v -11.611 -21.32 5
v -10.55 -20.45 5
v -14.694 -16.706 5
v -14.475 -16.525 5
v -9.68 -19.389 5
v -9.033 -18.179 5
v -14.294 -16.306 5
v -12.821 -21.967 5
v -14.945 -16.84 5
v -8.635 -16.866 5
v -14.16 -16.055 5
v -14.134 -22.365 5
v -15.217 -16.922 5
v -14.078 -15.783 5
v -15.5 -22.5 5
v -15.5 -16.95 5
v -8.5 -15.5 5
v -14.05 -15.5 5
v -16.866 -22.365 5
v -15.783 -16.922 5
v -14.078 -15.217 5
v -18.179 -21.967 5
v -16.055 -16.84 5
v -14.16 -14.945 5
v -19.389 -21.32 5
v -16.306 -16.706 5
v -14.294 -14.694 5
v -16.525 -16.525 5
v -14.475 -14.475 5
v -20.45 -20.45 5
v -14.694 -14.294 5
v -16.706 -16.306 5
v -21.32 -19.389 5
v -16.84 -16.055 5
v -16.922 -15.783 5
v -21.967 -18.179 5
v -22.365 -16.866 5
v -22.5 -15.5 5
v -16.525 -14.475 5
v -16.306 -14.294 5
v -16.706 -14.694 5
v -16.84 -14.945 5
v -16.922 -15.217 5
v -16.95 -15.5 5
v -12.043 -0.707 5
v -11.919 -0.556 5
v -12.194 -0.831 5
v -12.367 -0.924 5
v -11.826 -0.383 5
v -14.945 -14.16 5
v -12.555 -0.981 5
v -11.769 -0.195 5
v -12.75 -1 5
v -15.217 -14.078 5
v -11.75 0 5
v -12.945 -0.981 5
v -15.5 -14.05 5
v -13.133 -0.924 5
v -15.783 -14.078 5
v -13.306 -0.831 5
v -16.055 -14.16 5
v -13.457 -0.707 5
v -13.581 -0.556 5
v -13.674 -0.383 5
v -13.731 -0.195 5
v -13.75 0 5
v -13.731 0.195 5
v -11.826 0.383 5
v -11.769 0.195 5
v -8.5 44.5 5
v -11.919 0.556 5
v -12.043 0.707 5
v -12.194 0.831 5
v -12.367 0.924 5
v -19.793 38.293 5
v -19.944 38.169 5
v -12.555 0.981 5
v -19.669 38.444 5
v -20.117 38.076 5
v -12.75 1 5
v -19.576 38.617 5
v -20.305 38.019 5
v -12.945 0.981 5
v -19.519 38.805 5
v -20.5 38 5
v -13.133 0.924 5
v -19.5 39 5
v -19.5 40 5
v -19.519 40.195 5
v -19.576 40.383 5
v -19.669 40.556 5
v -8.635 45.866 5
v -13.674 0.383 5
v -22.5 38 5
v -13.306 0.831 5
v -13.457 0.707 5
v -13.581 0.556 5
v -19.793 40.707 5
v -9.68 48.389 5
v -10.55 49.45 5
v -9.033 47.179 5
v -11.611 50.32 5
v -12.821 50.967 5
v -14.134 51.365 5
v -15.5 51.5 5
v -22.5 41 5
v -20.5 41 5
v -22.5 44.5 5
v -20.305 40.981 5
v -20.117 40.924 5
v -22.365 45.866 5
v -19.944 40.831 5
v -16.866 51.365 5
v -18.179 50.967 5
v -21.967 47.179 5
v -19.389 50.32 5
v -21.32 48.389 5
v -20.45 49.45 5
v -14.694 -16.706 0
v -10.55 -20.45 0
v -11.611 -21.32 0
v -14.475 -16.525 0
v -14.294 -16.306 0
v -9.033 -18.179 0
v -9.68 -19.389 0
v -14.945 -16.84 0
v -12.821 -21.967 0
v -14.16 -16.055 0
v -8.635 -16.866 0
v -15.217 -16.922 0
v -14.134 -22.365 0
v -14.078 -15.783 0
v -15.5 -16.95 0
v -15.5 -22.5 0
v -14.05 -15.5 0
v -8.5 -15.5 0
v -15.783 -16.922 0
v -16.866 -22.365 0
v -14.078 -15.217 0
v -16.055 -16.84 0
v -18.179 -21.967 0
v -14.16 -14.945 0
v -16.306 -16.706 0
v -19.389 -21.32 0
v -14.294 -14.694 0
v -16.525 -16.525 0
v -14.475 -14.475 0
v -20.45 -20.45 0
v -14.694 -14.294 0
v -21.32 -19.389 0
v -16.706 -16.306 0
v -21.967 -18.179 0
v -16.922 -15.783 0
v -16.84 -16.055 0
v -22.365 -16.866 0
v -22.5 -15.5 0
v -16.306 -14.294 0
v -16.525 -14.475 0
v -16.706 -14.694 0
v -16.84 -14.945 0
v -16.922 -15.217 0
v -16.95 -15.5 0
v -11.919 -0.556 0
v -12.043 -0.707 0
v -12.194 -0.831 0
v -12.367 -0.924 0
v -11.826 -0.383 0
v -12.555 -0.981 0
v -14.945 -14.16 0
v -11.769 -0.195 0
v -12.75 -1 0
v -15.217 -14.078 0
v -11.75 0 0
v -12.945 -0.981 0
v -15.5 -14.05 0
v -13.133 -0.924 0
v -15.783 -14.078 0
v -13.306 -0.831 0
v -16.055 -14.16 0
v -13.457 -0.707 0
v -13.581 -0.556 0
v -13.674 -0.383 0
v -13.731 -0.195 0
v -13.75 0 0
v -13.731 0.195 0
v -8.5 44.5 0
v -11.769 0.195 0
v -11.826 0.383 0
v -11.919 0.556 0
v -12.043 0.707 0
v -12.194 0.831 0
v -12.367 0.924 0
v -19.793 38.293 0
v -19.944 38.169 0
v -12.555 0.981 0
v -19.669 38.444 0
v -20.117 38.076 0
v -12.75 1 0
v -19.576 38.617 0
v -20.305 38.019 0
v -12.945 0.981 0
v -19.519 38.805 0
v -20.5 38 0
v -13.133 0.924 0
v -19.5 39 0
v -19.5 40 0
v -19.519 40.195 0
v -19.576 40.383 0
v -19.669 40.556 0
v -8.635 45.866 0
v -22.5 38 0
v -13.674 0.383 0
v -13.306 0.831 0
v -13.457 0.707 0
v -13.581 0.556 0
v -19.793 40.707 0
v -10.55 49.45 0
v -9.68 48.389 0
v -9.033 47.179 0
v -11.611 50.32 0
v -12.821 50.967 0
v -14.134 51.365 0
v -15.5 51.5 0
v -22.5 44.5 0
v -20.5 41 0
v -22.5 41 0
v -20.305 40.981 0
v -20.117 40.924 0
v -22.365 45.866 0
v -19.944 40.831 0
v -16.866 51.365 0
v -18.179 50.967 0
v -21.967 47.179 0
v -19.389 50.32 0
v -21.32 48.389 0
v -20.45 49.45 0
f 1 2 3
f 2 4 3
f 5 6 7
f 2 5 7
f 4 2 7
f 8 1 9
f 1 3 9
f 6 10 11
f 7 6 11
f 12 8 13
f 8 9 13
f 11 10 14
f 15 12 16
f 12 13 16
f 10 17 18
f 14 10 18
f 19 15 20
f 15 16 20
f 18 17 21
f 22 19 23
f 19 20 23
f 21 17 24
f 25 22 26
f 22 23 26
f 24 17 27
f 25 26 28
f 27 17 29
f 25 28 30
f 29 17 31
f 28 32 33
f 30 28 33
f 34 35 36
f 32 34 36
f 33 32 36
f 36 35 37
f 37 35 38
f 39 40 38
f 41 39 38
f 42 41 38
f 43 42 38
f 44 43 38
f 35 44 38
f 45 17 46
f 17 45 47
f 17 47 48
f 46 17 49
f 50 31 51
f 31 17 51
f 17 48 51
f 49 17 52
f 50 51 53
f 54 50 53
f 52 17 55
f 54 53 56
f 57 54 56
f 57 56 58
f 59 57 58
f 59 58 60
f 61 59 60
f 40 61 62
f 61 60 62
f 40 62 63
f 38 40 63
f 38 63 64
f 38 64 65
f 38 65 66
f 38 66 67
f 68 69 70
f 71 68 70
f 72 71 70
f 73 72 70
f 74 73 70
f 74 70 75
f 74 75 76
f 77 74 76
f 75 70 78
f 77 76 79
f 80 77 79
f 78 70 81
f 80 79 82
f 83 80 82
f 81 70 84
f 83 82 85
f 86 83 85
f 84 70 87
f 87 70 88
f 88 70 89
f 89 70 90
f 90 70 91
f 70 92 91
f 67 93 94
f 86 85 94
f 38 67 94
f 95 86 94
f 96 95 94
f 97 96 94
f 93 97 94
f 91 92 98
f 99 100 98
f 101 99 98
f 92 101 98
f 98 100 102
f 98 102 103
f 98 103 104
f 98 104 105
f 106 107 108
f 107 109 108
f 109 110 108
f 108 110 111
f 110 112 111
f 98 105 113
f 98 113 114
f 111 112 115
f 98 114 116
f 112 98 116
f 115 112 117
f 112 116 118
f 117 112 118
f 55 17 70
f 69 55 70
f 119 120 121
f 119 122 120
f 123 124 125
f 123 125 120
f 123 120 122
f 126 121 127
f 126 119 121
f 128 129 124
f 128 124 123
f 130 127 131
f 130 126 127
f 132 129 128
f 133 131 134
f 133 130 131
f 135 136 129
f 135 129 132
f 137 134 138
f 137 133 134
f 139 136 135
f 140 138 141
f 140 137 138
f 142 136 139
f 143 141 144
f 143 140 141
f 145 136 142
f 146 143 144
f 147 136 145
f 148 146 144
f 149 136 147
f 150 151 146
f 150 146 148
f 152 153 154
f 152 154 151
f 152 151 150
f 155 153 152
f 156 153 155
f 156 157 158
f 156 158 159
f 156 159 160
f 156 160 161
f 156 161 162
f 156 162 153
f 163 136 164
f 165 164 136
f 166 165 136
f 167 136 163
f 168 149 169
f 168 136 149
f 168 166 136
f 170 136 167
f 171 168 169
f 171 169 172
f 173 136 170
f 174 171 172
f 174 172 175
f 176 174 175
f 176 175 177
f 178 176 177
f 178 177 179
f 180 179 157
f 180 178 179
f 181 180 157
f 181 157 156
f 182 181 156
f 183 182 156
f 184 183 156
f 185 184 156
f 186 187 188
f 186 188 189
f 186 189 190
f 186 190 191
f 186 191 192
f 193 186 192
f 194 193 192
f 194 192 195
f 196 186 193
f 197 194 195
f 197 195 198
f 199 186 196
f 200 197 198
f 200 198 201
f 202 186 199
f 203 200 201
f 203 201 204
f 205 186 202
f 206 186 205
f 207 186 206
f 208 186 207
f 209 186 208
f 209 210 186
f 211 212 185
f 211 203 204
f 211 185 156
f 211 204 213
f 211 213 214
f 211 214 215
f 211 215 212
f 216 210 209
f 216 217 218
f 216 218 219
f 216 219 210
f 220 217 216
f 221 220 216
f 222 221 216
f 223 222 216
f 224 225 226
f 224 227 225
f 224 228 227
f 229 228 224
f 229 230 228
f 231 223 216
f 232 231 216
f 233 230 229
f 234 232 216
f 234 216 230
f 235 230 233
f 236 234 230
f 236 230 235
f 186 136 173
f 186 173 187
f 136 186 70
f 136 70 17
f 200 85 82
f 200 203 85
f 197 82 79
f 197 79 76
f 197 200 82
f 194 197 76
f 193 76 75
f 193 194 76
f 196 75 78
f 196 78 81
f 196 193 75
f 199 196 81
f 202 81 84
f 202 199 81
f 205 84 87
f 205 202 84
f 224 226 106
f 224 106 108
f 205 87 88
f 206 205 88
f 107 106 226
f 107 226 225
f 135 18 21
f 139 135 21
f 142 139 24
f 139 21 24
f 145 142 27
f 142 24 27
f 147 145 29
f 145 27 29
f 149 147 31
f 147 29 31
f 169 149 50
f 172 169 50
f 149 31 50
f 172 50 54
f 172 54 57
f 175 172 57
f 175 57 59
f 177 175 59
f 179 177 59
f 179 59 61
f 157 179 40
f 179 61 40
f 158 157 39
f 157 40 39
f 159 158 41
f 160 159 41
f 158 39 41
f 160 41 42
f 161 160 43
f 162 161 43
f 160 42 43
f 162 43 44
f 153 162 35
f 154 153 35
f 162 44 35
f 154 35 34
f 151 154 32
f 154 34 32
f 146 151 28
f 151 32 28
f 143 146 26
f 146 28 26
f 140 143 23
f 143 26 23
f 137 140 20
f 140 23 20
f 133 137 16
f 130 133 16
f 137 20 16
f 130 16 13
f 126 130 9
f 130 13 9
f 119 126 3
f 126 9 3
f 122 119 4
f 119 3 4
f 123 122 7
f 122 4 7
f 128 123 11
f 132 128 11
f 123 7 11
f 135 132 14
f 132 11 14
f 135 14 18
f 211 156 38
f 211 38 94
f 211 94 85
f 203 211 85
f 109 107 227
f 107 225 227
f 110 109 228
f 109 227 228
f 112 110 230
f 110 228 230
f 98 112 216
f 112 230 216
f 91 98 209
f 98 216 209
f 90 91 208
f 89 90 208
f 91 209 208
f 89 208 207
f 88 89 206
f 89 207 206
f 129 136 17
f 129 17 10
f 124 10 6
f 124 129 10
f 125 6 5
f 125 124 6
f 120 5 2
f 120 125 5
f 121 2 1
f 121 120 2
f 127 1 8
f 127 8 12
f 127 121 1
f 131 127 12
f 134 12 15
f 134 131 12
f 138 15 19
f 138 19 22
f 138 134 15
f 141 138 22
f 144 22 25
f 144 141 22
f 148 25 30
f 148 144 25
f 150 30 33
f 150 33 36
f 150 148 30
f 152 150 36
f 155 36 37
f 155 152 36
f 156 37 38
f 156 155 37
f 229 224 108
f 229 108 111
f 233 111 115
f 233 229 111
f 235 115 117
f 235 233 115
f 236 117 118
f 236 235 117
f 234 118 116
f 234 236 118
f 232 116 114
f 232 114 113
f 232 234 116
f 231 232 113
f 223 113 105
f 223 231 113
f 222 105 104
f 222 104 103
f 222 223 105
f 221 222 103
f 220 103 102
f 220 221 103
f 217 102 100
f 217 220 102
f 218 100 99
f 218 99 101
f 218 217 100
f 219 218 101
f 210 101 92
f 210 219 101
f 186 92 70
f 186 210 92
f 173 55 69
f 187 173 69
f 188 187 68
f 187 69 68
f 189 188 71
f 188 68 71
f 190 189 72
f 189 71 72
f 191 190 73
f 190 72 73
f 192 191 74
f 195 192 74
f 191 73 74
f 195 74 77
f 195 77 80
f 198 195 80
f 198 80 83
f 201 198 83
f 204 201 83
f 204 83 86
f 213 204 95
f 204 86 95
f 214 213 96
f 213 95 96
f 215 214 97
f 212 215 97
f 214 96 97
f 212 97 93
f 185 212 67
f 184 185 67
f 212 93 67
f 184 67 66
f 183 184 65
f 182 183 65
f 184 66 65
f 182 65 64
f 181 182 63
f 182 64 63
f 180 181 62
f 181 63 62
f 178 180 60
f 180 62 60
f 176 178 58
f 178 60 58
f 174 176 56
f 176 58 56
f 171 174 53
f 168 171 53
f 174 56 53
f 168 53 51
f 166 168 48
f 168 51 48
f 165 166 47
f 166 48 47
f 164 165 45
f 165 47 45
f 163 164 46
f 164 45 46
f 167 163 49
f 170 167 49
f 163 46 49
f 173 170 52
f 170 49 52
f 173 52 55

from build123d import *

# Parameters (mm, degrees)
BOSS_EXTRUDE1_DEPTH = 5
SKETCH2_R           = 1
CUT_EXTRUDE1_DEPTH  = 5
SKETCH3_W           = 3
SKETCH3_H           = 3
CUT_EXTRUDE2_DEPTH  = 5
FILLET1_R           = 1
SKETCH4_R           = 1.45
CUT_EXTRUDE3_DEPTH  = 5


with BuildPart() as part:
    # Sketch1 → Boss-Extrude1 (new body)
    with BuildSketch(Plane.XY):
        with BuildLine():
            Line((-22.5, -15.5), (-22.5, 44.5))
            ThreePointArc((-22.5, 44.5), (-15.5, 51.5), (-8.5, 44.5))
            Line((-8.5, 44.5), (-8.5, -15.5))
            ThreePointArc((-8.5, -15.5), (-15.5, -22.5), (-22.5, -15.5))
        make_face()
    extrude(amount=BOSS_EXTRUDE1_DEPTH)

    # Sketch2 → Cut-Extrude1 (cut)
    with BuildSketch(Plane.XY.offset(5)):
        with Locations((-12.75, 0)):
            Circle(SKETCH2_R)
    extrude(amount=-CUT_EXTRUDE1_DEPTH, mode=Mode.SUBTRACT)

    # Sketch3 → Cut-Extrude2 (cut)
    with BuildSketch(Plane.XY.offset(5)):
        with Locations((-21, 39.5)):
            Rectangle(SKETCH3_W, SKETCH3_H)
    extrude(amount=-CUT_EXTRUDE2_DEPTH, mode=Mode.SUBTRACT)

    # Fillet1
    fillet1_edges = [part.edges().sort_by_distance(p)[0] for p in [
        (-19.5, 41, 2.5),
        (-19.5, 38, 2.5),
    ]]
    fillet(fillet1_edges, radius=FILLET1_R)

    # Sketch4 → Cut-Extrude3 (cut)
    with BuildSketch(Plane.XY.offset(5)):
        with Locations((-15.5, -15.5)):
            Circle(SKETCH4_R)
    extrude(amount=-CUT_EXTRUDE3_DEPTH, mode=Mode.SUBTRACT)


solid = part.part
